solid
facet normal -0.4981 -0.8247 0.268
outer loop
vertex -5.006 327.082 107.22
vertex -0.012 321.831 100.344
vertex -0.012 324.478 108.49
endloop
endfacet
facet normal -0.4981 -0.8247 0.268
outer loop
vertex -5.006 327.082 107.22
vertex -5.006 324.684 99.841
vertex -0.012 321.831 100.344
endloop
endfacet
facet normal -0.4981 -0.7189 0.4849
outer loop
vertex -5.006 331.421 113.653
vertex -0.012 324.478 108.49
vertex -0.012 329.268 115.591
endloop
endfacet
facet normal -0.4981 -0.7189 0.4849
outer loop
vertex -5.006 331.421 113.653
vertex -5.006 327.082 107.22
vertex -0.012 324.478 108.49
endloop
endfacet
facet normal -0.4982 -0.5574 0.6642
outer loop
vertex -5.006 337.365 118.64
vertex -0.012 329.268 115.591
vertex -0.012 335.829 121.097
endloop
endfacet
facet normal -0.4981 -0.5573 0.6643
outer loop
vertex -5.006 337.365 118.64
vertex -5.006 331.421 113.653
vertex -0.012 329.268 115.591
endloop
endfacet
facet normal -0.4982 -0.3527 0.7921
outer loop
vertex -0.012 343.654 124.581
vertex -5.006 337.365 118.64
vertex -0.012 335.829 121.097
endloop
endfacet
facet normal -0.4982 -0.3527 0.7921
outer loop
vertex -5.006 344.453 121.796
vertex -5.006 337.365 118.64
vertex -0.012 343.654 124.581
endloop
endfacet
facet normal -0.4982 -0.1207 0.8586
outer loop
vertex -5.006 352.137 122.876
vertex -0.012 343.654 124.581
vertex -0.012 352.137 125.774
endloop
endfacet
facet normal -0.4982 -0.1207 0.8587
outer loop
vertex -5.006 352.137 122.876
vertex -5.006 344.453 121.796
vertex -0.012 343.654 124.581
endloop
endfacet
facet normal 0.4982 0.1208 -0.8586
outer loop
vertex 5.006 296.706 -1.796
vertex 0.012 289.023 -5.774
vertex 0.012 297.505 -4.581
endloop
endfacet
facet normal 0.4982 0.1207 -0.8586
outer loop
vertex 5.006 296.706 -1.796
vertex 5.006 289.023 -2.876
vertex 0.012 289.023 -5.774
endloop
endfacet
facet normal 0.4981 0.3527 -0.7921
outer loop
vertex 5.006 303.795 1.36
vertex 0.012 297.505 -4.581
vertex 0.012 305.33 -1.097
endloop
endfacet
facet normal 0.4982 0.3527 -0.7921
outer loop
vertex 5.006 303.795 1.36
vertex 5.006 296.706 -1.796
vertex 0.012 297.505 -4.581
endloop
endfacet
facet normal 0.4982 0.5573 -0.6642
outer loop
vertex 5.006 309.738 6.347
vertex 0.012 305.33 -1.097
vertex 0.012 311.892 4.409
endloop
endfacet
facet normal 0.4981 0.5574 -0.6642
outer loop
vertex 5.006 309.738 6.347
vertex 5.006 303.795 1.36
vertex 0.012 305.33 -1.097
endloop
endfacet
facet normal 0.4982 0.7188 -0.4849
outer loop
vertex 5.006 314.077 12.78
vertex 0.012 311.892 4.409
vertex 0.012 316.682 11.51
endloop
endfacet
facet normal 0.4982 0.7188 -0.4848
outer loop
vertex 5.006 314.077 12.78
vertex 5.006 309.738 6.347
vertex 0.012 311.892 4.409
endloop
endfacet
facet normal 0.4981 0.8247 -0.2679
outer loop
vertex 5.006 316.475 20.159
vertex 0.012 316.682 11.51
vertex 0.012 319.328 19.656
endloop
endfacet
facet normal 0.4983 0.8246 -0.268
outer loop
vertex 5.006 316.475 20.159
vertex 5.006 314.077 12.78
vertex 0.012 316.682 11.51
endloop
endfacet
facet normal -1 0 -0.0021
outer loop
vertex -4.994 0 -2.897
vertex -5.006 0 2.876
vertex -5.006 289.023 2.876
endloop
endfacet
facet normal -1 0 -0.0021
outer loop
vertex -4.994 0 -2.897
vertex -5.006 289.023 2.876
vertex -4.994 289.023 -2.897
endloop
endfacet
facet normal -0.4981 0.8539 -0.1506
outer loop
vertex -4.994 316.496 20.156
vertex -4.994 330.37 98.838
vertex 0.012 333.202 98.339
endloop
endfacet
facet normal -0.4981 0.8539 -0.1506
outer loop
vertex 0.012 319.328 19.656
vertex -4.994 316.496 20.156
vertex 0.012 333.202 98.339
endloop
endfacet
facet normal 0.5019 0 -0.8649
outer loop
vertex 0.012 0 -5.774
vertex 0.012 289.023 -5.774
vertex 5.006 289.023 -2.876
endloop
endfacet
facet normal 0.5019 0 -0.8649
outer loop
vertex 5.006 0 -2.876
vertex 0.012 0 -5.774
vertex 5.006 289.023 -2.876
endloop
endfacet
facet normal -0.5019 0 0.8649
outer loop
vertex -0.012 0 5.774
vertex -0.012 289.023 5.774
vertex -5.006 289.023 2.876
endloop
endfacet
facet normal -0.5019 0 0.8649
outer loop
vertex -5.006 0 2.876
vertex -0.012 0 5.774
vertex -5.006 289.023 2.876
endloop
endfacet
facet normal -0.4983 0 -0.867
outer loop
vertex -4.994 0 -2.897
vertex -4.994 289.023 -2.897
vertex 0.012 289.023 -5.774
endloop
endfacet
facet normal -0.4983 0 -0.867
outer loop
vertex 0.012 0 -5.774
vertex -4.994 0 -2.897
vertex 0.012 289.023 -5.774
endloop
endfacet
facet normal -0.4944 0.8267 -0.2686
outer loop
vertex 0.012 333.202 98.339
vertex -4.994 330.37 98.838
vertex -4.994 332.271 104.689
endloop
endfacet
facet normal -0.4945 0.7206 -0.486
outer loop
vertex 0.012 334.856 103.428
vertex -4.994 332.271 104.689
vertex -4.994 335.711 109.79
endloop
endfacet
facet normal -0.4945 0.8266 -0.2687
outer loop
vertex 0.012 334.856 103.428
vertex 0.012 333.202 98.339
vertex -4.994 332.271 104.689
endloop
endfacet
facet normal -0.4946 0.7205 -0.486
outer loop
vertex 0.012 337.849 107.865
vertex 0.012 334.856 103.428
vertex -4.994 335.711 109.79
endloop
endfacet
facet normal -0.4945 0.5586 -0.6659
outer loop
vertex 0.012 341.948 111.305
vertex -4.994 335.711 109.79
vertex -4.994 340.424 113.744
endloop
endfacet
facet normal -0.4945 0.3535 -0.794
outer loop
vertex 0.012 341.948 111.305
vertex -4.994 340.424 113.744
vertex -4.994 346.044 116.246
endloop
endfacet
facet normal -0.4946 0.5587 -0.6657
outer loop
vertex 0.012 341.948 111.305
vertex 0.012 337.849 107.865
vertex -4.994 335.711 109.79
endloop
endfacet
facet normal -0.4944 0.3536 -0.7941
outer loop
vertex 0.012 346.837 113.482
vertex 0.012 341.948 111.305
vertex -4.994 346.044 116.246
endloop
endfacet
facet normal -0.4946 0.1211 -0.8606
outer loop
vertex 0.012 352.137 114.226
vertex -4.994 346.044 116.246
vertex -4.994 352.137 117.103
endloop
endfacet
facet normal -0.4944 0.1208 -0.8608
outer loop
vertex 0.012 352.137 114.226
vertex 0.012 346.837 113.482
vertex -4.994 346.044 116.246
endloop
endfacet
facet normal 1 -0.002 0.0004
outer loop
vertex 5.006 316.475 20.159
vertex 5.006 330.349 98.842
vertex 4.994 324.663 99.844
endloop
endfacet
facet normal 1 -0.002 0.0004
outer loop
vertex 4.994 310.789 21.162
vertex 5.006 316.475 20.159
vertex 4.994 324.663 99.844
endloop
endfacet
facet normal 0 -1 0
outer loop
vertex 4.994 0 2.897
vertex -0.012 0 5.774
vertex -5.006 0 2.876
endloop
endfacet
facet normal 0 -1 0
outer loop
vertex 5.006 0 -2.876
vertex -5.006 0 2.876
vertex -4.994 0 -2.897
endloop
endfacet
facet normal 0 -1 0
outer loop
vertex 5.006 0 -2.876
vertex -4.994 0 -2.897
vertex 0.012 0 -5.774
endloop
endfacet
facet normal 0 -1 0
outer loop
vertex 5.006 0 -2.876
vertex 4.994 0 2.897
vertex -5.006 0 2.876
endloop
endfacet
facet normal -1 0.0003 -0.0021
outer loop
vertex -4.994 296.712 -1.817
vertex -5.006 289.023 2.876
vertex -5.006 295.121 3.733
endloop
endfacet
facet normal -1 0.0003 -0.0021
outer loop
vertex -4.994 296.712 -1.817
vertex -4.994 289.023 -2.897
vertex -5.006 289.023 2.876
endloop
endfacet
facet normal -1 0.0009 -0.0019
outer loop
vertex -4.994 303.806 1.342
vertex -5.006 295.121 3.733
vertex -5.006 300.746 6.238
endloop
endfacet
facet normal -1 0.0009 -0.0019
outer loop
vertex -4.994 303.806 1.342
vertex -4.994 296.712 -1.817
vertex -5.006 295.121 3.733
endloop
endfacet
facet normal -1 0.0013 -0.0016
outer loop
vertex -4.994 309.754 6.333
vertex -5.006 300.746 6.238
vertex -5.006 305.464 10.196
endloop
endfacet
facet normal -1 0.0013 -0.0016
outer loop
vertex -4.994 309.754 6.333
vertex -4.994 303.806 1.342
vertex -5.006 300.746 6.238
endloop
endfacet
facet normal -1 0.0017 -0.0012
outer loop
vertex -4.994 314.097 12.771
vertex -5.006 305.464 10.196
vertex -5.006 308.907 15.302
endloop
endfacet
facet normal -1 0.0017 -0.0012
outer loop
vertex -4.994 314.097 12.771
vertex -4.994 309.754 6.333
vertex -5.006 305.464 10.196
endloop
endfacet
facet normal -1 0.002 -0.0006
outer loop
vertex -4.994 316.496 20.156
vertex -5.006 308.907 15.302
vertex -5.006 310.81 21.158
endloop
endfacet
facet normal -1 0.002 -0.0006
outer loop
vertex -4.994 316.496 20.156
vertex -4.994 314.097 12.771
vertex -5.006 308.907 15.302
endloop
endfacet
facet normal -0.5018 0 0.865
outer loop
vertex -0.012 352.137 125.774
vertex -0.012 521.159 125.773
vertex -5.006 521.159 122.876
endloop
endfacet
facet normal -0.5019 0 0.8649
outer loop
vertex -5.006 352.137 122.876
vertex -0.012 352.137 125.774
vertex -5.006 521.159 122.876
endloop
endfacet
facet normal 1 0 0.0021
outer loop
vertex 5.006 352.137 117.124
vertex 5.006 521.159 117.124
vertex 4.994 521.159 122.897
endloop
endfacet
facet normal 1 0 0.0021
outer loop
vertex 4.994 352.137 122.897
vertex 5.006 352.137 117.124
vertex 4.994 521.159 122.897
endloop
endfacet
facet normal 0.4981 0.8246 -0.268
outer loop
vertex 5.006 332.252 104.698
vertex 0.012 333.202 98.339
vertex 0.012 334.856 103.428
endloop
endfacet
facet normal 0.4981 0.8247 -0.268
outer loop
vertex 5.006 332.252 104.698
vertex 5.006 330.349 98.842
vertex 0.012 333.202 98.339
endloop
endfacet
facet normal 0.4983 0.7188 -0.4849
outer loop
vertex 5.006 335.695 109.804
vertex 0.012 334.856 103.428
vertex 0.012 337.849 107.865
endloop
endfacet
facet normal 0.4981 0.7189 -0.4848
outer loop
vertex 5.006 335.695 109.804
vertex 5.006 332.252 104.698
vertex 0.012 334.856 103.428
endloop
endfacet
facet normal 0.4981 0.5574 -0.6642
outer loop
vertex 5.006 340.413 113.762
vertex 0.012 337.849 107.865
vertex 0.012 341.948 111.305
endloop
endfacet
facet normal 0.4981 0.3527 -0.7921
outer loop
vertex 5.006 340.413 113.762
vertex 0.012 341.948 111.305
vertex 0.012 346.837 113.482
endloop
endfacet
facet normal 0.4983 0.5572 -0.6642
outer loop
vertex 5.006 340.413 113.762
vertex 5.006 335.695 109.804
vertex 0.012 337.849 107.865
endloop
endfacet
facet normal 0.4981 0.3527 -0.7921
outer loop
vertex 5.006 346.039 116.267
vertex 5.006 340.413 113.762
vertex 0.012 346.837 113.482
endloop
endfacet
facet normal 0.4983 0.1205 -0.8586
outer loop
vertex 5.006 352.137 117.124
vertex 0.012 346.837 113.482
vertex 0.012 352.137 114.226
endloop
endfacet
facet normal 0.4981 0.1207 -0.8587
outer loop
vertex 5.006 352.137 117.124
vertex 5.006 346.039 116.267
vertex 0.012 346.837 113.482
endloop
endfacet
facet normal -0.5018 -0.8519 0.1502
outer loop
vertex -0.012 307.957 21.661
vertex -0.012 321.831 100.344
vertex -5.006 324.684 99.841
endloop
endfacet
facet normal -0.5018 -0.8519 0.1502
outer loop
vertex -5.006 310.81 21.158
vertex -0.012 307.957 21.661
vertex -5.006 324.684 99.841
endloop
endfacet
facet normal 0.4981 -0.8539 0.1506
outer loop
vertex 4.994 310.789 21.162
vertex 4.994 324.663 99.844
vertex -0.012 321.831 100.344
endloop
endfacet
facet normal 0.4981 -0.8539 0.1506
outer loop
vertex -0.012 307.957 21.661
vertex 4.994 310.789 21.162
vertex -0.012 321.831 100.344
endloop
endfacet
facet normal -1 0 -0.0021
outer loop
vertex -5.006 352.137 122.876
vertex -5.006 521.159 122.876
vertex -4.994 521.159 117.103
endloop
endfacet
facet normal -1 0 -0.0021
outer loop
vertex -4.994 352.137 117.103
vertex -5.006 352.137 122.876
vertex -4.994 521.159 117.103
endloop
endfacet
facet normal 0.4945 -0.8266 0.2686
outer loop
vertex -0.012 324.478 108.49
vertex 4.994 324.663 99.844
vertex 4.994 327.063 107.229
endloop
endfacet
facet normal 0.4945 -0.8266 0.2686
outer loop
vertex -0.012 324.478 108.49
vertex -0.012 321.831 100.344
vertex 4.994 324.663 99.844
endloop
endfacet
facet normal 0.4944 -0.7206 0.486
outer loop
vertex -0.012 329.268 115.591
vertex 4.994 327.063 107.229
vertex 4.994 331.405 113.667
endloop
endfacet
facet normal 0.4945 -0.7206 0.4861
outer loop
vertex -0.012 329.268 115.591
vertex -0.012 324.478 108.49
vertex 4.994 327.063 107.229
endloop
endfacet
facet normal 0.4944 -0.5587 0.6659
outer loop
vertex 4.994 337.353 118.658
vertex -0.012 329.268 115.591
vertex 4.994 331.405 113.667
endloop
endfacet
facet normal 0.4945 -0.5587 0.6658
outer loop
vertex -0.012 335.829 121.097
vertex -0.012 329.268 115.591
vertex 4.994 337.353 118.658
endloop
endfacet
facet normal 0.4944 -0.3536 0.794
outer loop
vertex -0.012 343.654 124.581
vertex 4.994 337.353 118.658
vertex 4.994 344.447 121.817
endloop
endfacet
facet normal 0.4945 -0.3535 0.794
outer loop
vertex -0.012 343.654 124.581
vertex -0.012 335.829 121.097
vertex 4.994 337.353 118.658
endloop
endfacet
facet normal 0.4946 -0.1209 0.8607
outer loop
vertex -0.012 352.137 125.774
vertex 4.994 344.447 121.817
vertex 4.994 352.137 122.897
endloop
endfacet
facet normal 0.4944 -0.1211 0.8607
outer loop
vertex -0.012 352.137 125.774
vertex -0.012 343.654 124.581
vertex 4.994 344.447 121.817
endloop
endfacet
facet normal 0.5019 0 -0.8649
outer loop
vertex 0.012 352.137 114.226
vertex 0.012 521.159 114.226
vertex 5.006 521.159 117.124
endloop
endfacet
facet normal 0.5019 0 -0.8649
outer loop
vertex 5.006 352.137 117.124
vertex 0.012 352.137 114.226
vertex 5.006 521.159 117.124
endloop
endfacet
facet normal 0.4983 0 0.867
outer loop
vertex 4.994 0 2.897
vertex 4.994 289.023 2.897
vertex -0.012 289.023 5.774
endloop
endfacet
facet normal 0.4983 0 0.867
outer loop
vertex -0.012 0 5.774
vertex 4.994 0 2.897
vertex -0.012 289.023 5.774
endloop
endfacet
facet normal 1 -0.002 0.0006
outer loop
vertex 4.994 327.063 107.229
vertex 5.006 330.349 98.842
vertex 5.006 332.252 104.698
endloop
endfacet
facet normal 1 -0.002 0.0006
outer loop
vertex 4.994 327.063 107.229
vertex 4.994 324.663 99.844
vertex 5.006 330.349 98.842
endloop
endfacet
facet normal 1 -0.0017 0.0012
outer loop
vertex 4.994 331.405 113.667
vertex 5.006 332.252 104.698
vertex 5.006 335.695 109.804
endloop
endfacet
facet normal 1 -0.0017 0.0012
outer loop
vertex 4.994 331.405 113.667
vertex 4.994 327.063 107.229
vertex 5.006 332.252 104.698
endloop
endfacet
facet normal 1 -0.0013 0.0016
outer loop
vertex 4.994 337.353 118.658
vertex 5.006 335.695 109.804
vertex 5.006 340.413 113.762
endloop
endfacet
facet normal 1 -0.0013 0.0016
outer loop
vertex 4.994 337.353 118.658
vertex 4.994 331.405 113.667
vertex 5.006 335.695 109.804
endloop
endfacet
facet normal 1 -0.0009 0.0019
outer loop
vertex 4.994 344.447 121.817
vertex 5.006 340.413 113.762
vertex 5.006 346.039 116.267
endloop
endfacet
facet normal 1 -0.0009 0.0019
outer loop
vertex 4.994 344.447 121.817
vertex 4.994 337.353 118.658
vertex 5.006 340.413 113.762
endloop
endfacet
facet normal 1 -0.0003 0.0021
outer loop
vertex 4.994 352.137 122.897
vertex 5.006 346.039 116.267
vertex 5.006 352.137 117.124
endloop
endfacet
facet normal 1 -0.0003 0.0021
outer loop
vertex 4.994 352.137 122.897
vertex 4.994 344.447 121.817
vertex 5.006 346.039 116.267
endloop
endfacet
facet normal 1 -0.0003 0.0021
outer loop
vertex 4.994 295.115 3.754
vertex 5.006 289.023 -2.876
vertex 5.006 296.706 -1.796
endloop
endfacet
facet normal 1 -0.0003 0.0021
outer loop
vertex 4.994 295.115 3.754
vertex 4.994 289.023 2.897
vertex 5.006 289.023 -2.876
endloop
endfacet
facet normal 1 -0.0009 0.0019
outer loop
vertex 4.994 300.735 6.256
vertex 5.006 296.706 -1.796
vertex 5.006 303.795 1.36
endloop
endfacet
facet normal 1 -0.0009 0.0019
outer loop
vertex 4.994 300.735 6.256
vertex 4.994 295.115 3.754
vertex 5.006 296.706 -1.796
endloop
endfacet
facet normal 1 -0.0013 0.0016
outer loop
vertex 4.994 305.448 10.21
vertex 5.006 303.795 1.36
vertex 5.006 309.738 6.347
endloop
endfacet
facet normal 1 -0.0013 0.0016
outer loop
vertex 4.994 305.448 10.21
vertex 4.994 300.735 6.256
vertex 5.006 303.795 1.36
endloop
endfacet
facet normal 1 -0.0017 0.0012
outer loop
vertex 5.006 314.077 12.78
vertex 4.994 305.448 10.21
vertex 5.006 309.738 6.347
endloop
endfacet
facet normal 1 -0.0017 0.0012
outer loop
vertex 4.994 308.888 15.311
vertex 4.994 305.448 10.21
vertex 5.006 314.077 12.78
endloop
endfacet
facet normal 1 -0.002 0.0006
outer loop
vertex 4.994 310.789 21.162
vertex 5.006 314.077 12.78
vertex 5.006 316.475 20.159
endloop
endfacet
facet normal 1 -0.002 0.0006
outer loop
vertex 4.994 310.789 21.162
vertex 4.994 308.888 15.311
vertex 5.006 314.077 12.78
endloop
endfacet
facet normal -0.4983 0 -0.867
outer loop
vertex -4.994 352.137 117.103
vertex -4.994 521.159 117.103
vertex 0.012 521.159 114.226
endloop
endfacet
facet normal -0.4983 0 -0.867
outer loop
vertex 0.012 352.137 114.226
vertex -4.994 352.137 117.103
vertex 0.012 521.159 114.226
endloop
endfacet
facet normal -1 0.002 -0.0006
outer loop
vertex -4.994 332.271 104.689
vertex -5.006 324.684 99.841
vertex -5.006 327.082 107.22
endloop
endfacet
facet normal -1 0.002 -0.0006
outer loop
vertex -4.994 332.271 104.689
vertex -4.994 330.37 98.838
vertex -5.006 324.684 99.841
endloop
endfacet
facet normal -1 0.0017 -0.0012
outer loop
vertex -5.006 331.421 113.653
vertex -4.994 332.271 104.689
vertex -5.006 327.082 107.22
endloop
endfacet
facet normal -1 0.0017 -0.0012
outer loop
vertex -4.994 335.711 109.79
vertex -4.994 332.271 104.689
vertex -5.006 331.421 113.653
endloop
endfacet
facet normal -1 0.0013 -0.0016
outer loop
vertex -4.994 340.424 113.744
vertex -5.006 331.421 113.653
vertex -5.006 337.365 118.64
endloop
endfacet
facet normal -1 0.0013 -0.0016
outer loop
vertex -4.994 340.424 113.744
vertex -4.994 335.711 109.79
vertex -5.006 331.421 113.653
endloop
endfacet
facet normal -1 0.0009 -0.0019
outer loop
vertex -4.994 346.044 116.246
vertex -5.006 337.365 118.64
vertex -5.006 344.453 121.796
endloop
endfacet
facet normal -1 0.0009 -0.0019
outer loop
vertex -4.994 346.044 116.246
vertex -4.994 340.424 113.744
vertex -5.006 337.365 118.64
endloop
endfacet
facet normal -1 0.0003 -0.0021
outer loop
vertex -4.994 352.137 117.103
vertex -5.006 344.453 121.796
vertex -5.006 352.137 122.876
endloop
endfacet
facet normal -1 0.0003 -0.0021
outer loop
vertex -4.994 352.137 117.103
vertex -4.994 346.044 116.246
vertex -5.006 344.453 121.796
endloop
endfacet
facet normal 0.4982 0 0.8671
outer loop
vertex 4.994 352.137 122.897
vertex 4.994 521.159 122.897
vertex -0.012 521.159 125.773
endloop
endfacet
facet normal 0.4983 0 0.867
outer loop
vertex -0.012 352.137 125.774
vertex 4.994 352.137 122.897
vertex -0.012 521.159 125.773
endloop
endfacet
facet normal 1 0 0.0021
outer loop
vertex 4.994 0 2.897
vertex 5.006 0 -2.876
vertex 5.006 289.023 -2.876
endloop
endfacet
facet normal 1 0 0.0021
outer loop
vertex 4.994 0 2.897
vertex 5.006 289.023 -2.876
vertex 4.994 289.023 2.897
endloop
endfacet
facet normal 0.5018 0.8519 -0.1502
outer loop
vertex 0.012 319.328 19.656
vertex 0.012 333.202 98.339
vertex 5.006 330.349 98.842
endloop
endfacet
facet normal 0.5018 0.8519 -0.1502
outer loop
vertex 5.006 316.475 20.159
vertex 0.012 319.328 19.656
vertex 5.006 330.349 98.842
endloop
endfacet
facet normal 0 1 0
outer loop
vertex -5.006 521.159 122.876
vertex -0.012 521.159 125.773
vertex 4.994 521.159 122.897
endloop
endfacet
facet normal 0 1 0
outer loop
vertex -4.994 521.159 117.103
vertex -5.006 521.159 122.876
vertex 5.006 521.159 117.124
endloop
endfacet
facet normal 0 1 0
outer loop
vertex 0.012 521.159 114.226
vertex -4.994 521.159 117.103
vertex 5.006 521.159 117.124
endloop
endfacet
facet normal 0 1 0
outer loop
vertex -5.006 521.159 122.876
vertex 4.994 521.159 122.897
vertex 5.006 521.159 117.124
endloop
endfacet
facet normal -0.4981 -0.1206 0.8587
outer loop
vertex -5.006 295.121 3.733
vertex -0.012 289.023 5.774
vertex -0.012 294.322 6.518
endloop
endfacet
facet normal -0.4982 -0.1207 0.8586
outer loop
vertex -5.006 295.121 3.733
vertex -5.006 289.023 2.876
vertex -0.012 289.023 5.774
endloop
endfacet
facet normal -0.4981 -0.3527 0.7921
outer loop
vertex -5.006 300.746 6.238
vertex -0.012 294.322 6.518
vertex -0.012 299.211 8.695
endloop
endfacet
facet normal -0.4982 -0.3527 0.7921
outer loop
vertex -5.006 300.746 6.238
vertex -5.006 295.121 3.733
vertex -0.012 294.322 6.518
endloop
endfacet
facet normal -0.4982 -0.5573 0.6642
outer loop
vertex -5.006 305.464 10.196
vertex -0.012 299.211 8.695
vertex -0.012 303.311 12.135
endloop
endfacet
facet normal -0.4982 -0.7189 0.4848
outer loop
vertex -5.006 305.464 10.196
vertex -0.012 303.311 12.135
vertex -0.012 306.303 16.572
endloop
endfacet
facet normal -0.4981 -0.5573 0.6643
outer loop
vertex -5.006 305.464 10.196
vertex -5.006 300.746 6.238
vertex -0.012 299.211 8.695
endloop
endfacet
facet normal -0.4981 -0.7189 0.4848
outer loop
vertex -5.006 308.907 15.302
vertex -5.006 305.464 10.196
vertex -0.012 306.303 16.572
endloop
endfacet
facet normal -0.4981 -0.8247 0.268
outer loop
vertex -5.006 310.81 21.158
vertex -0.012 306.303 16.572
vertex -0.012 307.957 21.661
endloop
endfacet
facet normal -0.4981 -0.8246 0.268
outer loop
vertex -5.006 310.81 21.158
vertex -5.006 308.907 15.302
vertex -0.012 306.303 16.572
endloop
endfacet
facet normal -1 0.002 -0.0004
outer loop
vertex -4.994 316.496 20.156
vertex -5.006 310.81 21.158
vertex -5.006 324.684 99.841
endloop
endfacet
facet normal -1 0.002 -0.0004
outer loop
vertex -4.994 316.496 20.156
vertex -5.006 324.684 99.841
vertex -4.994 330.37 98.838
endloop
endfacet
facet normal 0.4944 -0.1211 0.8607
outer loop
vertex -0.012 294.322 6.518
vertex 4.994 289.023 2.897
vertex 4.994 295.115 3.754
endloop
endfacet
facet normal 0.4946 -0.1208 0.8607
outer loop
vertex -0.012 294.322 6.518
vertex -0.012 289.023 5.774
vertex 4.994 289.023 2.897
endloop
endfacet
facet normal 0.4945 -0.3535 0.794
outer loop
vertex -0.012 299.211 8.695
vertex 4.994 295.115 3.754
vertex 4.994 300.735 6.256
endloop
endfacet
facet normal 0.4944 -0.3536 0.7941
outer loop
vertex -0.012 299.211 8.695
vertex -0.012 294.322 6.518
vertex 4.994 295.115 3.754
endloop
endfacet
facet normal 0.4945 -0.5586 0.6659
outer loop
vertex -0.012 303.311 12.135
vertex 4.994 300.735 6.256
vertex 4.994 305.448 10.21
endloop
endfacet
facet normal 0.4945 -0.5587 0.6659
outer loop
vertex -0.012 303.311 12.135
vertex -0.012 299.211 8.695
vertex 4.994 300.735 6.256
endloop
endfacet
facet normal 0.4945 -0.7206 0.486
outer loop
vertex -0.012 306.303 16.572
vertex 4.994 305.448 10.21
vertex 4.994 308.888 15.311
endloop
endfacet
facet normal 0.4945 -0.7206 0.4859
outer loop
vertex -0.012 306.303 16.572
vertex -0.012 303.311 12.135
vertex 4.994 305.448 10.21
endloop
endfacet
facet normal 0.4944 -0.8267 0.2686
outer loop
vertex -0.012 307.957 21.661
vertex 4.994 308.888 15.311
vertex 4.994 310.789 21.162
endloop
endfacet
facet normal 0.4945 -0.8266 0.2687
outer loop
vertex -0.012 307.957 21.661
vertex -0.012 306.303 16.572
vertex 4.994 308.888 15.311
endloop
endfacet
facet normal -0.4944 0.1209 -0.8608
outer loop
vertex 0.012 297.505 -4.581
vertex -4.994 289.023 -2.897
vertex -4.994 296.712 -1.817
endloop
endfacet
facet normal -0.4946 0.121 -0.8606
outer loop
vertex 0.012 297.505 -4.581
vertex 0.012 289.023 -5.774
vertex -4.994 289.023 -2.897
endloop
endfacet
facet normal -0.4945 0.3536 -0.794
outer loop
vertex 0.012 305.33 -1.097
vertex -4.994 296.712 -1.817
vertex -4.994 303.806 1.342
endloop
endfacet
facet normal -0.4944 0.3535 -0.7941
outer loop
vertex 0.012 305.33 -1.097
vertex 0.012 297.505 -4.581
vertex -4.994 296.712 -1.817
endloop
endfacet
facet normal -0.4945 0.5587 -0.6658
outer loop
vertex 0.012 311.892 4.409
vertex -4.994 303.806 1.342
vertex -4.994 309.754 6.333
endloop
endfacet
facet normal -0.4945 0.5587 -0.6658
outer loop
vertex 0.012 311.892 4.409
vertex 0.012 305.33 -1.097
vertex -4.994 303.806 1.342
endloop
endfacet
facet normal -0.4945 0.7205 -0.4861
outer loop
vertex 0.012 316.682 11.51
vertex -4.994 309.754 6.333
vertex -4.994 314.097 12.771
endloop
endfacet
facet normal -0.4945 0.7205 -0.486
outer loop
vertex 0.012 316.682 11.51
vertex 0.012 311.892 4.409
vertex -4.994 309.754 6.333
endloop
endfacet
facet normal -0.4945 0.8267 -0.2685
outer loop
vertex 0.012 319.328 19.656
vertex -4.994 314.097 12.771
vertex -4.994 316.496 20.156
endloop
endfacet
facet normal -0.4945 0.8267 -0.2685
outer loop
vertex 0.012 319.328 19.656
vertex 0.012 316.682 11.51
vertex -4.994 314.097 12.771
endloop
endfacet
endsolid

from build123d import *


with BuildPart() as f2:
    # F2: sweep along a path in F1
    with BuildLine(Plane.YZ) as f2_path:
        Line((0, 0), (289.022509, 0))
        ThreePointArc((289.022509, 0), (305.092199, 5.848889), (313.642703, 20.658796))
        Line((313.642703, 20.658796), (327.516535, 99.341204))
        ThreePointArc((327.516535, 99.341204), (336.067038, 114.151111), (352.136728, 120))
        Line((352.136728, 120), (521.159238, 120))
    # F0 (on Front) → F2 (sweep)
    with BuildSketch(Plane.XZ):
        Polygon((0.012307, -5.773503), (5.006153, -2.876093), (4.993847, 2.897409), (-0.012307, 5.773503), (-5.006153, 2.876093), (-4.993847, -2.897409), align=None)
    sweep(path=f2_path.line)


solid = f2.part
